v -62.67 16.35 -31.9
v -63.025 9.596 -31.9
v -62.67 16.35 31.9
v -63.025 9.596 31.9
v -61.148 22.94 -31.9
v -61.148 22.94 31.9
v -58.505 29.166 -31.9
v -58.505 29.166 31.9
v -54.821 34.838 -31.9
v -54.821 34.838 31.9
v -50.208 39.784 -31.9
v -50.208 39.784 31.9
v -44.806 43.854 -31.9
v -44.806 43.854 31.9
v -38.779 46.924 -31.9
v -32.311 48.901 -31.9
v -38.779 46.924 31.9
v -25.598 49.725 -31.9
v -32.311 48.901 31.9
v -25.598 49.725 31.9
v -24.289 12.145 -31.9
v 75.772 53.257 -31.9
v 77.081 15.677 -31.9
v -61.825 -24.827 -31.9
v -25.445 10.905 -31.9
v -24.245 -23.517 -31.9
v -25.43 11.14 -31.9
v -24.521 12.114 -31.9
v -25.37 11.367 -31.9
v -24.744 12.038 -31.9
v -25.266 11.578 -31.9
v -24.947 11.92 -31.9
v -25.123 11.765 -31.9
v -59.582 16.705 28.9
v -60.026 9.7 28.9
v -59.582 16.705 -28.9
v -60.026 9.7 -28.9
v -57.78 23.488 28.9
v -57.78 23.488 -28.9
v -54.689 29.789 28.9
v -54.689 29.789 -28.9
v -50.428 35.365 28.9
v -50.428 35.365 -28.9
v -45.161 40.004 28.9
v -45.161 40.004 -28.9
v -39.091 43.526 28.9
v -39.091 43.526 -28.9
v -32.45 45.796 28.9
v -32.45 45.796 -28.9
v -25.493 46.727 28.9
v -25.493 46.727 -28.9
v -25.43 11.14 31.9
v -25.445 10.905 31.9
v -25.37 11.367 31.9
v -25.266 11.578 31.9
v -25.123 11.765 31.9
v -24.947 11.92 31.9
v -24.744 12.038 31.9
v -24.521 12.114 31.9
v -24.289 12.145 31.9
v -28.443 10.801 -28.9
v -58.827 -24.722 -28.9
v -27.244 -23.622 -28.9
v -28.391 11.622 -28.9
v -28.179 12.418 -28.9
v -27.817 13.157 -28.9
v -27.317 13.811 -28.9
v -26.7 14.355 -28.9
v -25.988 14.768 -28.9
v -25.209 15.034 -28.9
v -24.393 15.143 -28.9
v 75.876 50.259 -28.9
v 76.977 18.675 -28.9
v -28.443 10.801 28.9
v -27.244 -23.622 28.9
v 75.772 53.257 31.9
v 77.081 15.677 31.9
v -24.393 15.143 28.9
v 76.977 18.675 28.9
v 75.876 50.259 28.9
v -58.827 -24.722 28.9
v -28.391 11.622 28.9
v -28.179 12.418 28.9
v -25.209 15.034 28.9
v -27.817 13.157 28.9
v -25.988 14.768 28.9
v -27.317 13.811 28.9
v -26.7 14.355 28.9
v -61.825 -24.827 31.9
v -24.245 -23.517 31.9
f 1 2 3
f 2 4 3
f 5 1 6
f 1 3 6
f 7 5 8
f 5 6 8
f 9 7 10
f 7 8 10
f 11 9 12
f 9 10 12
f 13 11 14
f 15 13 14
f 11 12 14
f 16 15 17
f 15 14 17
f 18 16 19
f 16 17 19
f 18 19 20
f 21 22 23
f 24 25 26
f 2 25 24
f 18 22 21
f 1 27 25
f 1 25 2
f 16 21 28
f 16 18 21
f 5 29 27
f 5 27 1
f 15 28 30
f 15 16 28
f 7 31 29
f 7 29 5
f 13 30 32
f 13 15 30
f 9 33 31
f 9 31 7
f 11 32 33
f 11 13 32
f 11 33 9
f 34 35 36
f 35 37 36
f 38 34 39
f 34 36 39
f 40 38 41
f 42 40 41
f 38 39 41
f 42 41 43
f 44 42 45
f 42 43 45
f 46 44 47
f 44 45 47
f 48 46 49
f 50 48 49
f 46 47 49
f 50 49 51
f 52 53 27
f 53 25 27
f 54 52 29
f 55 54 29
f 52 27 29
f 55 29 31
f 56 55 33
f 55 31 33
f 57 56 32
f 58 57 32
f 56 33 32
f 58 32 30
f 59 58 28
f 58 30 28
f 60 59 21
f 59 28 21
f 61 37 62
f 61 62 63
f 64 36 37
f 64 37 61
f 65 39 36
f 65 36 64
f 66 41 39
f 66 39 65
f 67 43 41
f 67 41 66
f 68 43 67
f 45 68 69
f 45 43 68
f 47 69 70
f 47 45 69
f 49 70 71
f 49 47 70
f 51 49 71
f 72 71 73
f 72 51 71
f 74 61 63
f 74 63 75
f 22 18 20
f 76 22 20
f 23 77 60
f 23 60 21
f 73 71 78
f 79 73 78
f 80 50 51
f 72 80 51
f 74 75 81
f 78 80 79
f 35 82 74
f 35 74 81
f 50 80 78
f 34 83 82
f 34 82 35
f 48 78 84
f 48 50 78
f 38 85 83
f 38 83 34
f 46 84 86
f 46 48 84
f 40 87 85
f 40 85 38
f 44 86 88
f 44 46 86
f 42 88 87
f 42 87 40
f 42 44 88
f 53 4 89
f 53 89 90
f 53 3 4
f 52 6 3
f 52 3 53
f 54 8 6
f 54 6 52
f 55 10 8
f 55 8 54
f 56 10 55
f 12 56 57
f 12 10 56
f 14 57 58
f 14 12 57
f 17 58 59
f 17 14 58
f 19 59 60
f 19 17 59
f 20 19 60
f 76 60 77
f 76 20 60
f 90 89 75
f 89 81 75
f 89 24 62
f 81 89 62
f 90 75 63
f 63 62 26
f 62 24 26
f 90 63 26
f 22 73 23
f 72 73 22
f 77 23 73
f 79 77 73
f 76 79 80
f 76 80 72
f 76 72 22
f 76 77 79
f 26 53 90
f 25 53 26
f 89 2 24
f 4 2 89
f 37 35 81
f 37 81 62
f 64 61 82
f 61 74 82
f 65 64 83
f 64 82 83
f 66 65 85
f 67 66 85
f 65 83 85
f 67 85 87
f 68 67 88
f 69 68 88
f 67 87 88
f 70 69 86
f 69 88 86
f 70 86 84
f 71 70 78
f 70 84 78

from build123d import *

# Parameters (mm, degrees)
SKETCH2_W   = 63.80012688
SKETCH2_H   = 37.602651942
SKETCH2_W_2 = 57.80012688
SKETCH2_H_2 = 31.602651942


with BuildPart() as part:
    # Sweep-Thin1: sweep along a path in Sketch1
    with BuildLine(Plane.XY) as sweep_thin1_path:
        Line((-43.035286794, -24.171802054), (-44.234672924, 10.250579859))
        ThreePointArc((-44.234672924, 10.250579859), (-38.872819675, 24.588121657), (-24.943243853, 30.934891896))
        Line((-24.943243853, 30.934891896), (76.426266413, 34.466930581))
    # Sketch2 → Sweep-Thin1 (sweep)
    with BuildSketch(Plane(origin=(76.426266413, 34.466930581, 0), x_dir=(0, 0, -1), z_dir=(0.999393527672129, 0.034822074134917426, 0))):
        Rectangle(SKETCH2_W, SKETCH2_H)
        Rectangle(SKETCH2_W_2, SKETCH2_H_2, mode=Mode.SUBTRACT)
    sweep(path=sweep_thin1_path.line)


solid = part.part
